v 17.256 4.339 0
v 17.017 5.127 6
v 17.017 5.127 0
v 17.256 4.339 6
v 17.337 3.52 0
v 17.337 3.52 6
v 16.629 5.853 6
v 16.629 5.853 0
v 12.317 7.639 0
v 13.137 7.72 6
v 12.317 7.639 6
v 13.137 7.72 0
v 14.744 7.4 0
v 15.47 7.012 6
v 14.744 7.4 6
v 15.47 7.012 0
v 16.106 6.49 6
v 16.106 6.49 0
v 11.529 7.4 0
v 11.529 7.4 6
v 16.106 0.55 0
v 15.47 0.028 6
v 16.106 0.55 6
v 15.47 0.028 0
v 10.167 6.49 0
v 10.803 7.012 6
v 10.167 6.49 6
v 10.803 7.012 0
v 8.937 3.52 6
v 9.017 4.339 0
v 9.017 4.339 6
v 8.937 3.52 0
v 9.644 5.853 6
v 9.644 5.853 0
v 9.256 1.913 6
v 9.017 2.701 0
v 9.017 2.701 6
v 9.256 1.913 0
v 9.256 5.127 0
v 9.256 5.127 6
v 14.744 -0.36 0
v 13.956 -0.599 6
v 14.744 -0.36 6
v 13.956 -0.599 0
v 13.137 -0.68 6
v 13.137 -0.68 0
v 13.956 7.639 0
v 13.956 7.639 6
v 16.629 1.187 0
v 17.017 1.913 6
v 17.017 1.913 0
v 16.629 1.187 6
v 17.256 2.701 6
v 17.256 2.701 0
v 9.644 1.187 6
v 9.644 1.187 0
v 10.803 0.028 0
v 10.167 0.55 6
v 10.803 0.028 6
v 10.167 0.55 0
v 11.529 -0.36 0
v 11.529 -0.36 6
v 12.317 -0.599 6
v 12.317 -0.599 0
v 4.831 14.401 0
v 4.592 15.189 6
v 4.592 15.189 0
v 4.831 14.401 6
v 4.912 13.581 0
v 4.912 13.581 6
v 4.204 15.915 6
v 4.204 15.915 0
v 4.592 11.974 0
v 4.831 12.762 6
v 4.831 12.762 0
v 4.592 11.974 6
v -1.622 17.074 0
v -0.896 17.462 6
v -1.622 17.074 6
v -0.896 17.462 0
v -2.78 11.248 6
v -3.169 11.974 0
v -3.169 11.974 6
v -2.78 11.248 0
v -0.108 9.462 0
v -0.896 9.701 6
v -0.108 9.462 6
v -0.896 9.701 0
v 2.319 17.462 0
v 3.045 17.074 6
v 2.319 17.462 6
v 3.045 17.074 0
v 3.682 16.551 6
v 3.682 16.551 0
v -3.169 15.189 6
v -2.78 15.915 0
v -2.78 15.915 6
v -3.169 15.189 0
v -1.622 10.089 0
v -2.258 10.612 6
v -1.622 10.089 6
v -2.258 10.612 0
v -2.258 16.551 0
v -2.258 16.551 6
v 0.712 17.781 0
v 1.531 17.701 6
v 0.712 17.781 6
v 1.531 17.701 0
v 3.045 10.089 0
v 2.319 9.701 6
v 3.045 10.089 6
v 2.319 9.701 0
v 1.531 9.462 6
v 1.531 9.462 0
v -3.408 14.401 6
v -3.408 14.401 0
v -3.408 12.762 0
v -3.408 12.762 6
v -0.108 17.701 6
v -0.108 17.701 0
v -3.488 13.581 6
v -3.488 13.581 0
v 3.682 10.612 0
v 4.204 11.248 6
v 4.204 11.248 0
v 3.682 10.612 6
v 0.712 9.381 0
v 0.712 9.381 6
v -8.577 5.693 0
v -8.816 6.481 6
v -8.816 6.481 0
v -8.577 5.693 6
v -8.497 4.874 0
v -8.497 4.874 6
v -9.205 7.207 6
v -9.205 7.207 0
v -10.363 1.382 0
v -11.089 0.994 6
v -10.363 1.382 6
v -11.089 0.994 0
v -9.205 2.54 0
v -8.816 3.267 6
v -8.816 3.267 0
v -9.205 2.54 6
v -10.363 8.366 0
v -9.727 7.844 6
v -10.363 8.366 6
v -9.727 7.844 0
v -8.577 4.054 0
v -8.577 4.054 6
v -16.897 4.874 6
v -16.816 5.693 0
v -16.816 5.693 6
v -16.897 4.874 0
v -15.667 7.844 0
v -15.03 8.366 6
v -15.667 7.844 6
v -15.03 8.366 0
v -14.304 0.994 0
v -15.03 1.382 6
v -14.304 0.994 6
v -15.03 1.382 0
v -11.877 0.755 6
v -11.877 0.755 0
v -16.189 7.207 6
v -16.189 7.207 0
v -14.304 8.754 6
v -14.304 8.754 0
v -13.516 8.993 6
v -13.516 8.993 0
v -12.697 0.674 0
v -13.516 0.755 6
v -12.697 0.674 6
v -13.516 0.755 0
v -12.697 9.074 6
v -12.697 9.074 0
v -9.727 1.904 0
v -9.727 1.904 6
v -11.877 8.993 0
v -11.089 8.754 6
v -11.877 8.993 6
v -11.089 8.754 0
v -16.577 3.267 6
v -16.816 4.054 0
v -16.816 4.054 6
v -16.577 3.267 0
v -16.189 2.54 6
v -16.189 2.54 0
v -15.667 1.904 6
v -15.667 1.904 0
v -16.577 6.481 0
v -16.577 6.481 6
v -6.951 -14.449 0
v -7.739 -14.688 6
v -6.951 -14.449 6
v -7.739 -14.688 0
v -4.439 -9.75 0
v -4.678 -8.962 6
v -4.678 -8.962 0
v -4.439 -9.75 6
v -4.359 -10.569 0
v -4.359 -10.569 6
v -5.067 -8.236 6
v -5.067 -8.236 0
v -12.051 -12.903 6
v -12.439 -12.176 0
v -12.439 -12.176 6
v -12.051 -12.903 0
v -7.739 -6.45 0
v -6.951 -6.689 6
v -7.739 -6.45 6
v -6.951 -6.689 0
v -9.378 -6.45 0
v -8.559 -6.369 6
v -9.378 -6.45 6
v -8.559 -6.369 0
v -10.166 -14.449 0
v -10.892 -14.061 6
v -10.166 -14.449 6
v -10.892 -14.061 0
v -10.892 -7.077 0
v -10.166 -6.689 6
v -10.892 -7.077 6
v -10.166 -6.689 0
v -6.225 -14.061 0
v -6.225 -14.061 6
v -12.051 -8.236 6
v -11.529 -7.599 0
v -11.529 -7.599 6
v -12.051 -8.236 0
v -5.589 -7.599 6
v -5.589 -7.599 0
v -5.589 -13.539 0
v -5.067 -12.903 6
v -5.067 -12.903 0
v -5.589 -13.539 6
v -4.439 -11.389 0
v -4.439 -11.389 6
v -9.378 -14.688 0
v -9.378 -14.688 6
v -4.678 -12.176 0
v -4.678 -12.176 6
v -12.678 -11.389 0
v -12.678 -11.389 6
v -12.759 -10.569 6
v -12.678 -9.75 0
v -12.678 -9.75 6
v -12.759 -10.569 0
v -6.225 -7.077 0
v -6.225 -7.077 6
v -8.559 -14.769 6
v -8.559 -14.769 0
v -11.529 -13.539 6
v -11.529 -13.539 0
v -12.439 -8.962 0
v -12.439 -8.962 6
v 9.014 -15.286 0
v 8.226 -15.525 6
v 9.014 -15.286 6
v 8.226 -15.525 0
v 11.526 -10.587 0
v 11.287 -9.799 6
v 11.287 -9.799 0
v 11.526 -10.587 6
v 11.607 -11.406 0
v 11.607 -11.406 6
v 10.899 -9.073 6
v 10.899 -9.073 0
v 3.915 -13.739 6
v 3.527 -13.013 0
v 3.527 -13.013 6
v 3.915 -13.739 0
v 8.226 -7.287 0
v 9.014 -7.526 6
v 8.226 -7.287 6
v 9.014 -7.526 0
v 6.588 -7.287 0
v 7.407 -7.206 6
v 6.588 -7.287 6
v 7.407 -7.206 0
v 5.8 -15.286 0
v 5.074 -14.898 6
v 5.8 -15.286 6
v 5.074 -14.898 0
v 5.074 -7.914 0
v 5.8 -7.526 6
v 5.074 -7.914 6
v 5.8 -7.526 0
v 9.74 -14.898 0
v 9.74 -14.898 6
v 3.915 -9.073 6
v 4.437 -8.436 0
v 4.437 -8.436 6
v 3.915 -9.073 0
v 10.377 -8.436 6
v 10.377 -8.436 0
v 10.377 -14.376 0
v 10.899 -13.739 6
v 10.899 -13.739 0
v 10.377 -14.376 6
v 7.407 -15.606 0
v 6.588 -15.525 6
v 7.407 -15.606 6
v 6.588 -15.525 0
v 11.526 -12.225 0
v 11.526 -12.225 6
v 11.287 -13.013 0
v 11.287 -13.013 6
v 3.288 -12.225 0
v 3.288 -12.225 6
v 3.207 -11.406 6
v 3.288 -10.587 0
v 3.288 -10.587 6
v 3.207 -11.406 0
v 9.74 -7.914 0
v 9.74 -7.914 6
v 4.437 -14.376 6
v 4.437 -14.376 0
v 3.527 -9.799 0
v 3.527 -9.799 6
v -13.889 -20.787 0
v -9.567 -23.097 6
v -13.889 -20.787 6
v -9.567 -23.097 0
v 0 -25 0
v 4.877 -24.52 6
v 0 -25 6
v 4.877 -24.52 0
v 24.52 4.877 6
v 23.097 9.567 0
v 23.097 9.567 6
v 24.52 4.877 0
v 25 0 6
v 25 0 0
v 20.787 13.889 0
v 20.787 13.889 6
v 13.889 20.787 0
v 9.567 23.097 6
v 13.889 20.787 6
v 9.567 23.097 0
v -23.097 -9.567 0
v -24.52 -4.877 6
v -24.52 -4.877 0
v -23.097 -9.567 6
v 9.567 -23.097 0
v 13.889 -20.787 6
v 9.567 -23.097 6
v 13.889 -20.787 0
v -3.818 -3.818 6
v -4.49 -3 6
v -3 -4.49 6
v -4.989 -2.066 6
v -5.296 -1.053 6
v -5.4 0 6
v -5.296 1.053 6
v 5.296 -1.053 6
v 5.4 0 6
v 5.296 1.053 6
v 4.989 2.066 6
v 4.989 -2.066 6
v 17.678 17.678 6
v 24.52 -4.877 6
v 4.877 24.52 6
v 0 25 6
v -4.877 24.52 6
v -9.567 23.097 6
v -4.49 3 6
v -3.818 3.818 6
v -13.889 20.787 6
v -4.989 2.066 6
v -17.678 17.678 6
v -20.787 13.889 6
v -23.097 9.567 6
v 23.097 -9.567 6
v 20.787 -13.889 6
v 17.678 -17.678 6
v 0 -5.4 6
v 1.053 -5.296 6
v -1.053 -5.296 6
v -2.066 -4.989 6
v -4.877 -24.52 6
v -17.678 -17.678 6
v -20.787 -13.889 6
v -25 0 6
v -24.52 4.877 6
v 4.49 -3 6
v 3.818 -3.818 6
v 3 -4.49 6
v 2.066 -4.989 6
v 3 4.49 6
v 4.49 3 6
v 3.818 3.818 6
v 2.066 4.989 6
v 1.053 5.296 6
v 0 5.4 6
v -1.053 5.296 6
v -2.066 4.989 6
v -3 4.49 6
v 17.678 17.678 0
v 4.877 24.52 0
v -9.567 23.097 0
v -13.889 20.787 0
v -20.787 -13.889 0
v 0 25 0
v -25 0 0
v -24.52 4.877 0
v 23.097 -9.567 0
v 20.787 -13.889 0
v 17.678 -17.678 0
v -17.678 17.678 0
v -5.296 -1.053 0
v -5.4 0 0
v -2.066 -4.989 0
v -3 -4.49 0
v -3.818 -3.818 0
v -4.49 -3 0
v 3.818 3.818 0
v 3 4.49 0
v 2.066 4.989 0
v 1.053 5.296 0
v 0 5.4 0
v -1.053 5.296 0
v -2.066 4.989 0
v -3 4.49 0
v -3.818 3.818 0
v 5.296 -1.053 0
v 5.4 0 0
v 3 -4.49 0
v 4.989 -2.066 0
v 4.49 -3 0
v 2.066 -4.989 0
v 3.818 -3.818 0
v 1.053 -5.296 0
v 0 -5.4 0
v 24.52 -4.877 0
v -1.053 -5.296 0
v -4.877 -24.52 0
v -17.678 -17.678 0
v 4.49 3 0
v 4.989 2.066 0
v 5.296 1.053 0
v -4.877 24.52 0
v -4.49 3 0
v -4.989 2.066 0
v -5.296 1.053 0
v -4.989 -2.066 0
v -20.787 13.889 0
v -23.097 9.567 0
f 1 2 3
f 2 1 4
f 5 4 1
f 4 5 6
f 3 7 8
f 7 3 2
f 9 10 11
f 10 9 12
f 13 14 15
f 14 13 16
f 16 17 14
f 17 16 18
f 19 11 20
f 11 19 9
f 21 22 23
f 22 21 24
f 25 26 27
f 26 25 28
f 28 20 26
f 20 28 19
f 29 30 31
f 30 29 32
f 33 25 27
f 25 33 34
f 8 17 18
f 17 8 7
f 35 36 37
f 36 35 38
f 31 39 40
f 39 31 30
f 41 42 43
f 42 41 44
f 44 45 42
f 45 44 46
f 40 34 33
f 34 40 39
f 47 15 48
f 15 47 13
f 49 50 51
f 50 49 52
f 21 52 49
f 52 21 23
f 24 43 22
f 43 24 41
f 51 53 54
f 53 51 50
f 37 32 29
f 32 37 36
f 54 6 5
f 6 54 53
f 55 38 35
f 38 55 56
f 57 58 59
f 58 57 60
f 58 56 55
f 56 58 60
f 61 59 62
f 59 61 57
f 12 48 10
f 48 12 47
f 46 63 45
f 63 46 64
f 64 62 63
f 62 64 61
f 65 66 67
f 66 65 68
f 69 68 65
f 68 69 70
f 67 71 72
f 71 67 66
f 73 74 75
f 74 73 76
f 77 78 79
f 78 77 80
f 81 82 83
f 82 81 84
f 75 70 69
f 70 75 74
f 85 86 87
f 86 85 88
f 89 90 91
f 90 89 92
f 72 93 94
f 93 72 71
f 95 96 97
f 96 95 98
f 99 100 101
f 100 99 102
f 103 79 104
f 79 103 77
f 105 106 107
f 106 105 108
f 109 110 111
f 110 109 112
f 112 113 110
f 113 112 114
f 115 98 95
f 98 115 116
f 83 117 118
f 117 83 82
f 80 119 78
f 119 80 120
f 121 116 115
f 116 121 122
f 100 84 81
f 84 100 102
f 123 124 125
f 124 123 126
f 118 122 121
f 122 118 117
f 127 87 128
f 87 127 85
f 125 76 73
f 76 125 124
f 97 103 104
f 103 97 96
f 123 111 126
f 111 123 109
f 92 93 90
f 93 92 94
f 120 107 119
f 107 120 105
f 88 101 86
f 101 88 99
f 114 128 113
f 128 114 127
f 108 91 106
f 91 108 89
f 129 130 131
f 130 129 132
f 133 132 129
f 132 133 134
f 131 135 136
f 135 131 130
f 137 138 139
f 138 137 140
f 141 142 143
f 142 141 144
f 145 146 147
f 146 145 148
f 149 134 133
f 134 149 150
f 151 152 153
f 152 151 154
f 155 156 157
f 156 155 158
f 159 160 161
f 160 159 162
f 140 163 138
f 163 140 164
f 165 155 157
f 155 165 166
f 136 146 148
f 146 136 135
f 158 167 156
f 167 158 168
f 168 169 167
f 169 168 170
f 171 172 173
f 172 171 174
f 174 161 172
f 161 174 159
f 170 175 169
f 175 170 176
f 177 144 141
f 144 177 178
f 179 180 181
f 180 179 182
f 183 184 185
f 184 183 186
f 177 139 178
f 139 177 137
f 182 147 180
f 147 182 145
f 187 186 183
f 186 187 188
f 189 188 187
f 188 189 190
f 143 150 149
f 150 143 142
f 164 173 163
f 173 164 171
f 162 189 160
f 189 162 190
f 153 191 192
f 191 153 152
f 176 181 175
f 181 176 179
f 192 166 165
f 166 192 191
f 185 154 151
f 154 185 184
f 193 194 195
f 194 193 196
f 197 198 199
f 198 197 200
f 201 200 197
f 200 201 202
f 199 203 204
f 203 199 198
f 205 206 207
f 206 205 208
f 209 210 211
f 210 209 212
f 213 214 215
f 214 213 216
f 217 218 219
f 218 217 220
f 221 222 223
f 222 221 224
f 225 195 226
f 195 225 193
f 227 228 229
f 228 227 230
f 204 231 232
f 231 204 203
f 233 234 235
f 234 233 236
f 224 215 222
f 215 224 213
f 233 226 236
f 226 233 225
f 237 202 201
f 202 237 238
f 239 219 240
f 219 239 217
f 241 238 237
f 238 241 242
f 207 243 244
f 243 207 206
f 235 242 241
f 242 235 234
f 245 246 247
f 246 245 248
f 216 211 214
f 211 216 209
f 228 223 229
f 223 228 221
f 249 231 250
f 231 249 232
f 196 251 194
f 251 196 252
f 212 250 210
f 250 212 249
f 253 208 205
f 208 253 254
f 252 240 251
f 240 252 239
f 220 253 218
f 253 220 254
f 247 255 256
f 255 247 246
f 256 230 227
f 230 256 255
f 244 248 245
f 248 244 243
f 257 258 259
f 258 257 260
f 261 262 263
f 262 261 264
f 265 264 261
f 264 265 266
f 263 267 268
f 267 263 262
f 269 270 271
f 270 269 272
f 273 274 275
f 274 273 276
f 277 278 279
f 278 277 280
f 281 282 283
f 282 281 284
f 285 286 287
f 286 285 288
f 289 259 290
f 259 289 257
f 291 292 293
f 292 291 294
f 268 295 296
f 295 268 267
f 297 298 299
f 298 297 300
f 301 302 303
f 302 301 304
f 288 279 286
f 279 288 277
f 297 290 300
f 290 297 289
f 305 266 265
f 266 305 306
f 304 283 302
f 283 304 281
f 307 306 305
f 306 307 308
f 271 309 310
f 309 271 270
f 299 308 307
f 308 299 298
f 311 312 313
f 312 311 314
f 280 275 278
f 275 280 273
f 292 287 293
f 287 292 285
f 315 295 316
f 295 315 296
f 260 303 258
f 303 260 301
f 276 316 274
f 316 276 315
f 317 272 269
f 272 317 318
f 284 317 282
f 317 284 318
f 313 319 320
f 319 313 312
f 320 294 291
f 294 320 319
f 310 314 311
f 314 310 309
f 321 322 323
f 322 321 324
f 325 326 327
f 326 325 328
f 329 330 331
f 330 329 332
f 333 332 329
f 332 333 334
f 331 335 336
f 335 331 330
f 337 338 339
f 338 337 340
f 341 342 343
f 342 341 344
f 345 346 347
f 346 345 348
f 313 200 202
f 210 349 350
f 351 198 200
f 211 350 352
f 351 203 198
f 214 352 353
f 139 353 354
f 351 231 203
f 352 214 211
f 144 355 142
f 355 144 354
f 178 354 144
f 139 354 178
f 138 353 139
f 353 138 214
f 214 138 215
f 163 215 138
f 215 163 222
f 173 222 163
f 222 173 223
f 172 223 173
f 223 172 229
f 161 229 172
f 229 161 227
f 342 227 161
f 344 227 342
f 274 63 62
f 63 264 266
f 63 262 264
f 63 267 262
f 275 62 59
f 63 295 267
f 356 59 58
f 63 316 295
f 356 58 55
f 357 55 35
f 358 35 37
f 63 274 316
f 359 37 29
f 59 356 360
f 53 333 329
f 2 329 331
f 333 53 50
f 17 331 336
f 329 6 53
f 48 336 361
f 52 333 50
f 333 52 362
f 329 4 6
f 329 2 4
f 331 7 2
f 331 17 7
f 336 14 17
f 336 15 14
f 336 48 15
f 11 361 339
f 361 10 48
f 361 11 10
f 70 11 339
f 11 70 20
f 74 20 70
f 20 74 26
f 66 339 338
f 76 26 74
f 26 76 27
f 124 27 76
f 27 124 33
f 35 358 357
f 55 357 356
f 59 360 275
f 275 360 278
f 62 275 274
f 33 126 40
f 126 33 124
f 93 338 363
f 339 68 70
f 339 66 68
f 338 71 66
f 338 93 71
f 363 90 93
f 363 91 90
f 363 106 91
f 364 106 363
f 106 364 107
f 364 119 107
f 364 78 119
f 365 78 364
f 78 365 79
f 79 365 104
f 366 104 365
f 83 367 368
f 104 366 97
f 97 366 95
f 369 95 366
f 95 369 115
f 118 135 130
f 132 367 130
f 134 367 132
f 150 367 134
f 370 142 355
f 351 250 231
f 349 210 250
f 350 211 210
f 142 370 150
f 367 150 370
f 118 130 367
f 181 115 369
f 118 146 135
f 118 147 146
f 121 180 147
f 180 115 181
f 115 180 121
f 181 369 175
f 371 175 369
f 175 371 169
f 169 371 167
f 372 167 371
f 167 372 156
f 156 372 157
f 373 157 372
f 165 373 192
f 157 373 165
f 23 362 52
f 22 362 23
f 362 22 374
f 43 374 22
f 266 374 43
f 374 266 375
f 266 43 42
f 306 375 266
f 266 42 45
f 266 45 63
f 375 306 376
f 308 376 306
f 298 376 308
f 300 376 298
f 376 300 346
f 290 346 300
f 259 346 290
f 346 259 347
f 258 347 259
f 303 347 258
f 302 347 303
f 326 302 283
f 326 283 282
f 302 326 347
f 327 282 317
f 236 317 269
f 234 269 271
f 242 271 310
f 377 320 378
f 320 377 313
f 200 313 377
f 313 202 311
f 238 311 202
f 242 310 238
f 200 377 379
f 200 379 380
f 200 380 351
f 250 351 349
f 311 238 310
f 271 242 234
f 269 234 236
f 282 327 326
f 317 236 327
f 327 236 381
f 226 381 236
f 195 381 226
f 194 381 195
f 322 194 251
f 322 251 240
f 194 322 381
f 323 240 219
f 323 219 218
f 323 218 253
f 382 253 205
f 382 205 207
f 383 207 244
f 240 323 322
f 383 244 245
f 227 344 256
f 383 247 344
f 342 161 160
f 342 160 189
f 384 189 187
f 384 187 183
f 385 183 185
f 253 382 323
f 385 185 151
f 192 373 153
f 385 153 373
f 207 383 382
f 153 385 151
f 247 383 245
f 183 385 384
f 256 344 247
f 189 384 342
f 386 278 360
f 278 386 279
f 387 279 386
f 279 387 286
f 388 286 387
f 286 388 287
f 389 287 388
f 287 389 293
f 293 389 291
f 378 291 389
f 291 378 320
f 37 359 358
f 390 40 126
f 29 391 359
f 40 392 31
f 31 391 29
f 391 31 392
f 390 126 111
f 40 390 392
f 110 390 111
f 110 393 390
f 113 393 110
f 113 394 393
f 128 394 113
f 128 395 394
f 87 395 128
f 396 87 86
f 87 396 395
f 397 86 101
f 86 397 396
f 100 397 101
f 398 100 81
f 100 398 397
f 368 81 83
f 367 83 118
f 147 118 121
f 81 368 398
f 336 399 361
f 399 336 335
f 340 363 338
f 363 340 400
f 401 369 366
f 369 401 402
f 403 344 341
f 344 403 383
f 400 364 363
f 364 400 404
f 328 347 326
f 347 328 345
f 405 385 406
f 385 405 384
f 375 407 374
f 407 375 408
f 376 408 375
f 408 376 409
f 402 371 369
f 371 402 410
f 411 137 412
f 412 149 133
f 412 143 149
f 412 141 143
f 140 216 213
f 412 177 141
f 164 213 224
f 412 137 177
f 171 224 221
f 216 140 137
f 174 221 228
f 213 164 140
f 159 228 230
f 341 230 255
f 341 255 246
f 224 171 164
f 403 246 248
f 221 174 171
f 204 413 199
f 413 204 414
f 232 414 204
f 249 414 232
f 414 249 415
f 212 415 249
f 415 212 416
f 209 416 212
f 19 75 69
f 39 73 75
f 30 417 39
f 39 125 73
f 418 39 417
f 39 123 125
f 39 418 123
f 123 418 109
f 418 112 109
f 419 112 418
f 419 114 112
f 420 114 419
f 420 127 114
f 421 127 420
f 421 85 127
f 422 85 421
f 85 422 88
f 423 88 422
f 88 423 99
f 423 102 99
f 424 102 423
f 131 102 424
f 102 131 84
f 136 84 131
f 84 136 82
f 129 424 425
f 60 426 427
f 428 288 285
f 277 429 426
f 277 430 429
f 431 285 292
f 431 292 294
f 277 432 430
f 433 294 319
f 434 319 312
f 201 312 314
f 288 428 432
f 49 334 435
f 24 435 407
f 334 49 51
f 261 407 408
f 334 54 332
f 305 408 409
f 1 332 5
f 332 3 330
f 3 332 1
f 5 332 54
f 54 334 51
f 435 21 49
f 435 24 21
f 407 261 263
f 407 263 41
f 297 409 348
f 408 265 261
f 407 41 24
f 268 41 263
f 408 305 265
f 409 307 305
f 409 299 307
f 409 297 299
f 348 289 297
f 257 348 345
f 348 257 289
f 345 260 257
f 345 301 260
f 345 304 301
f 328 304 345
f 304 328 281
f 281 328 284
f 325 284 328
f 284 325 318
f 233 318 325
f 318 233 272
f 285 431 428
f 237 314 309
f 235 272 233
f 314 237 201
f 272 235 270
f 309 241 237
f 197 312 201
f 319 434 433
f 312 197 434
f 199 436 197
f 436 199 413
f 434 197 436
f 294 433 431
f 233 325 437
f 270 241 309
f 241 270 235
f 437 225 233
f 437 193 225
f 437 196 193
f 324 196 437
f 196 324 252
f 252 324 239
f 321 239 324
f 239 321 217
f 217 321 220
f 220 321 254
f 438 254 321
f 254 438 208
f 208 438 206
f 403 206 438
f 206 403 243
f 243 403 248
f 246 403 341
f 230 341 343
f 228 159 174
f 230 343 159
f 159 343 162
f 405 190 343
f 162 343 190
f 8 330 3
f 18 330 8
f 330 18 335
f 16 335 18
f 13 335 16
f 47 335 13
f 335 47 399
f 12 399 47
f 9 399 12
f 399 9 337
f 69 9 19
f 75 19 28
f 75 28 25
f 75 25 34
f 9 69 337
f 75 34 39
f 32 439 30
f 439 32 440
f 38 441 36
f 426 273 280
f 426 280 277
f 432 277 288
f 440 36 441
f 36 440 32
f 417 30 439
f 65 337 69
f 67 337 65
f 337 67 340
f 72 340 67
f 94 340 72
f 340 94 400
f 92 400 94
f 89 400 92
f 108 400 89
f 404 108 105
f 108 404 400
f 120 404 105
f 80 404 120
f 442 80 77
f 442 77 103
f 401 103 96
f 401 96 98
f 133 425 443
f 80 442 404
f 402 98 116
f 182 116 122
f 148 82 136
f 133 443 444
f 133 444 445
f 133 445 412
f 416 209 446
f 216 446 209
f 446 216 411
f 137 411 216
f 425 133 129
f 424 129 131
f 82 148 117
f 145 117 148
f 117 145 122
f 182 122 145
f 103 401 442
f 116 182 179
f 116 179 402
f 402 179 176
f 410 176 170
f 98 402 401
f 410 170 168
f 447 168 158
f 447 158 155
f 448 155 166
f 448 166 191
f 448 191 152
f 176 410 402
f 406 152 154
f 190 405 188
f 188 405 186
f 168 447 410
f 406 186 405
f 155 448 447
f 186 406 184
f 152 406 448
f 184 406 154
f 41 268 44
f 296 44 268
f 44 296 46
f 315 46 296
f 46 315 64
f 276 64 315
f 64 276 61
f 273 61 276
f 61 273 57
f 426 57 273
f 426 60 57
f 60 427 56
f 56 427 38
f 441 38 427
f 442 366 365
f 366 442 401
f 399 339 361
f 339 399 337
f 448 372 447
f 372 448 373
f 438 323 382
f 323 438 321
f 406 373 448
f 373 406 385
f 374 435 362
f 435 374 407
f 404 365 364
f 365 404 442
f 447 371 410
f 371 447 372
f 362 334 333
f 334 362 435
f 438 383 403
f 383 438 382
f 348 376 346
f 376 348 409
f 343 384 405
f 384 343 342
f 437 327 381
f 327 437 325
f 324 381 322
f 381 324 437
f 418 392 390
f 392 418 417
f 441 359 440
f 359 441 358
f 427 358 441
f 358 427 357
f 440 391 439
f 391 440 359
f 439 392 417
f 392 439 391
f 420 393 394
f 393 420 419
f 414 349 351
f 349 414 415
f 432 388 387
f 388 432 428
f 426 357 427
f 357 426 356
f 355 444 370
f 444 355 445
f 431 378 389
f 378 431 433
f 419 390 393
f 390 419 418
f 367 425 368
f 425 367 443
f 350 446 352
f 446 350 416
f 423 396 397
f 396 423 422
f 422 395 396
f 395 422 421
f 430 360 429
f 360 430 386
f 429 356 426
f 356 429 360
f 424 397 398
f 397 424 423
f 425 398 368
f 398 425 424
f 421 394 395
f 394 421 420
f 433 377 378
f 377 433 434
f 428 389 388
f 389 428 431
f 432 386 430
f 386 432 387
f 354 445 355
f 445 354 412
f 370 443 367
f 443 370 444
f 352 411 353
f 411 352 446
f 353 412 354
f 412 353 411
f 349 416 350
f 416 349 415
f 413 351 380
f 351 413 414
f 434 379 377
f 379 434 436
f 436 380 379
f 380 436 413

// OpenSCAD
$fn = 32;

// ----------------------------------------------------------------------
// Flange Ø50 x 6
// 5 holes on a Ø27.2 bolt circle, bolted joints
// ----------------------------------------------------------------------

// --- parameters (mm) ---
flange_d = 50;   // outside diameter of the flange
thickness = 6;   // flange thickness
holes = 5;       // number of bolt holes
pcd = 27.2;      // bolt circle diameter
start_deg = 15;  // angle of the first hole, from +X
hole_d = 8.4;    // bolt hole diameter
bore_d = 10.8;   // central through bore
hub_d = 18.8;    // hub outside diameter
hub_h = 0;       // hub height above the flange face (0 = no hub)

// --- derived feature positions (mm) ---
height = thickness + hub_h;  // = 6   overall height of the part
pcd_r = pcd / 2;             // = 13.6   bolt circle radius
hole_step = 360 / holes;     // = 72   angular pitch
feature_centers = [
  [pcd_r * cos(start_deg + 0 * hole_step), pcd_r * sin(start_deg + 0 * hole_step)],
  [pcd_r * cos(start_deg + 1 * hole_step), pcd_r * sin(start_deg + 1 * hole_step)],
  [pcd_r * cos(start_deg + 2 * hole_step), pcd_r * sin(start_deg + 2 * hole_step)],
  [pcd_r * cos(start_deg + 3 * hole_step), pcd_r * sin(start_deg + 3 * hole_step)],
  [pcd_r * cos(start_deg + 4 * hole_step), pcd_r * sin(start_deg + 4 * hole_step)]
];   // bolt hole centres on the pitch circle

// flange disc, every hole and the bore cut straight through
difference() {
  union() {
    cylinder(d = flange_d, h = thickness);
  }
  translate([0, 0, -1]) cylinder(d = bore_d, h = height + 2);  // bore, through
  for (centre = feature_centers)
    translate([centre[0], centre[1], -1]) cylinder(d = hole_d, h = thickness + 2);
}
